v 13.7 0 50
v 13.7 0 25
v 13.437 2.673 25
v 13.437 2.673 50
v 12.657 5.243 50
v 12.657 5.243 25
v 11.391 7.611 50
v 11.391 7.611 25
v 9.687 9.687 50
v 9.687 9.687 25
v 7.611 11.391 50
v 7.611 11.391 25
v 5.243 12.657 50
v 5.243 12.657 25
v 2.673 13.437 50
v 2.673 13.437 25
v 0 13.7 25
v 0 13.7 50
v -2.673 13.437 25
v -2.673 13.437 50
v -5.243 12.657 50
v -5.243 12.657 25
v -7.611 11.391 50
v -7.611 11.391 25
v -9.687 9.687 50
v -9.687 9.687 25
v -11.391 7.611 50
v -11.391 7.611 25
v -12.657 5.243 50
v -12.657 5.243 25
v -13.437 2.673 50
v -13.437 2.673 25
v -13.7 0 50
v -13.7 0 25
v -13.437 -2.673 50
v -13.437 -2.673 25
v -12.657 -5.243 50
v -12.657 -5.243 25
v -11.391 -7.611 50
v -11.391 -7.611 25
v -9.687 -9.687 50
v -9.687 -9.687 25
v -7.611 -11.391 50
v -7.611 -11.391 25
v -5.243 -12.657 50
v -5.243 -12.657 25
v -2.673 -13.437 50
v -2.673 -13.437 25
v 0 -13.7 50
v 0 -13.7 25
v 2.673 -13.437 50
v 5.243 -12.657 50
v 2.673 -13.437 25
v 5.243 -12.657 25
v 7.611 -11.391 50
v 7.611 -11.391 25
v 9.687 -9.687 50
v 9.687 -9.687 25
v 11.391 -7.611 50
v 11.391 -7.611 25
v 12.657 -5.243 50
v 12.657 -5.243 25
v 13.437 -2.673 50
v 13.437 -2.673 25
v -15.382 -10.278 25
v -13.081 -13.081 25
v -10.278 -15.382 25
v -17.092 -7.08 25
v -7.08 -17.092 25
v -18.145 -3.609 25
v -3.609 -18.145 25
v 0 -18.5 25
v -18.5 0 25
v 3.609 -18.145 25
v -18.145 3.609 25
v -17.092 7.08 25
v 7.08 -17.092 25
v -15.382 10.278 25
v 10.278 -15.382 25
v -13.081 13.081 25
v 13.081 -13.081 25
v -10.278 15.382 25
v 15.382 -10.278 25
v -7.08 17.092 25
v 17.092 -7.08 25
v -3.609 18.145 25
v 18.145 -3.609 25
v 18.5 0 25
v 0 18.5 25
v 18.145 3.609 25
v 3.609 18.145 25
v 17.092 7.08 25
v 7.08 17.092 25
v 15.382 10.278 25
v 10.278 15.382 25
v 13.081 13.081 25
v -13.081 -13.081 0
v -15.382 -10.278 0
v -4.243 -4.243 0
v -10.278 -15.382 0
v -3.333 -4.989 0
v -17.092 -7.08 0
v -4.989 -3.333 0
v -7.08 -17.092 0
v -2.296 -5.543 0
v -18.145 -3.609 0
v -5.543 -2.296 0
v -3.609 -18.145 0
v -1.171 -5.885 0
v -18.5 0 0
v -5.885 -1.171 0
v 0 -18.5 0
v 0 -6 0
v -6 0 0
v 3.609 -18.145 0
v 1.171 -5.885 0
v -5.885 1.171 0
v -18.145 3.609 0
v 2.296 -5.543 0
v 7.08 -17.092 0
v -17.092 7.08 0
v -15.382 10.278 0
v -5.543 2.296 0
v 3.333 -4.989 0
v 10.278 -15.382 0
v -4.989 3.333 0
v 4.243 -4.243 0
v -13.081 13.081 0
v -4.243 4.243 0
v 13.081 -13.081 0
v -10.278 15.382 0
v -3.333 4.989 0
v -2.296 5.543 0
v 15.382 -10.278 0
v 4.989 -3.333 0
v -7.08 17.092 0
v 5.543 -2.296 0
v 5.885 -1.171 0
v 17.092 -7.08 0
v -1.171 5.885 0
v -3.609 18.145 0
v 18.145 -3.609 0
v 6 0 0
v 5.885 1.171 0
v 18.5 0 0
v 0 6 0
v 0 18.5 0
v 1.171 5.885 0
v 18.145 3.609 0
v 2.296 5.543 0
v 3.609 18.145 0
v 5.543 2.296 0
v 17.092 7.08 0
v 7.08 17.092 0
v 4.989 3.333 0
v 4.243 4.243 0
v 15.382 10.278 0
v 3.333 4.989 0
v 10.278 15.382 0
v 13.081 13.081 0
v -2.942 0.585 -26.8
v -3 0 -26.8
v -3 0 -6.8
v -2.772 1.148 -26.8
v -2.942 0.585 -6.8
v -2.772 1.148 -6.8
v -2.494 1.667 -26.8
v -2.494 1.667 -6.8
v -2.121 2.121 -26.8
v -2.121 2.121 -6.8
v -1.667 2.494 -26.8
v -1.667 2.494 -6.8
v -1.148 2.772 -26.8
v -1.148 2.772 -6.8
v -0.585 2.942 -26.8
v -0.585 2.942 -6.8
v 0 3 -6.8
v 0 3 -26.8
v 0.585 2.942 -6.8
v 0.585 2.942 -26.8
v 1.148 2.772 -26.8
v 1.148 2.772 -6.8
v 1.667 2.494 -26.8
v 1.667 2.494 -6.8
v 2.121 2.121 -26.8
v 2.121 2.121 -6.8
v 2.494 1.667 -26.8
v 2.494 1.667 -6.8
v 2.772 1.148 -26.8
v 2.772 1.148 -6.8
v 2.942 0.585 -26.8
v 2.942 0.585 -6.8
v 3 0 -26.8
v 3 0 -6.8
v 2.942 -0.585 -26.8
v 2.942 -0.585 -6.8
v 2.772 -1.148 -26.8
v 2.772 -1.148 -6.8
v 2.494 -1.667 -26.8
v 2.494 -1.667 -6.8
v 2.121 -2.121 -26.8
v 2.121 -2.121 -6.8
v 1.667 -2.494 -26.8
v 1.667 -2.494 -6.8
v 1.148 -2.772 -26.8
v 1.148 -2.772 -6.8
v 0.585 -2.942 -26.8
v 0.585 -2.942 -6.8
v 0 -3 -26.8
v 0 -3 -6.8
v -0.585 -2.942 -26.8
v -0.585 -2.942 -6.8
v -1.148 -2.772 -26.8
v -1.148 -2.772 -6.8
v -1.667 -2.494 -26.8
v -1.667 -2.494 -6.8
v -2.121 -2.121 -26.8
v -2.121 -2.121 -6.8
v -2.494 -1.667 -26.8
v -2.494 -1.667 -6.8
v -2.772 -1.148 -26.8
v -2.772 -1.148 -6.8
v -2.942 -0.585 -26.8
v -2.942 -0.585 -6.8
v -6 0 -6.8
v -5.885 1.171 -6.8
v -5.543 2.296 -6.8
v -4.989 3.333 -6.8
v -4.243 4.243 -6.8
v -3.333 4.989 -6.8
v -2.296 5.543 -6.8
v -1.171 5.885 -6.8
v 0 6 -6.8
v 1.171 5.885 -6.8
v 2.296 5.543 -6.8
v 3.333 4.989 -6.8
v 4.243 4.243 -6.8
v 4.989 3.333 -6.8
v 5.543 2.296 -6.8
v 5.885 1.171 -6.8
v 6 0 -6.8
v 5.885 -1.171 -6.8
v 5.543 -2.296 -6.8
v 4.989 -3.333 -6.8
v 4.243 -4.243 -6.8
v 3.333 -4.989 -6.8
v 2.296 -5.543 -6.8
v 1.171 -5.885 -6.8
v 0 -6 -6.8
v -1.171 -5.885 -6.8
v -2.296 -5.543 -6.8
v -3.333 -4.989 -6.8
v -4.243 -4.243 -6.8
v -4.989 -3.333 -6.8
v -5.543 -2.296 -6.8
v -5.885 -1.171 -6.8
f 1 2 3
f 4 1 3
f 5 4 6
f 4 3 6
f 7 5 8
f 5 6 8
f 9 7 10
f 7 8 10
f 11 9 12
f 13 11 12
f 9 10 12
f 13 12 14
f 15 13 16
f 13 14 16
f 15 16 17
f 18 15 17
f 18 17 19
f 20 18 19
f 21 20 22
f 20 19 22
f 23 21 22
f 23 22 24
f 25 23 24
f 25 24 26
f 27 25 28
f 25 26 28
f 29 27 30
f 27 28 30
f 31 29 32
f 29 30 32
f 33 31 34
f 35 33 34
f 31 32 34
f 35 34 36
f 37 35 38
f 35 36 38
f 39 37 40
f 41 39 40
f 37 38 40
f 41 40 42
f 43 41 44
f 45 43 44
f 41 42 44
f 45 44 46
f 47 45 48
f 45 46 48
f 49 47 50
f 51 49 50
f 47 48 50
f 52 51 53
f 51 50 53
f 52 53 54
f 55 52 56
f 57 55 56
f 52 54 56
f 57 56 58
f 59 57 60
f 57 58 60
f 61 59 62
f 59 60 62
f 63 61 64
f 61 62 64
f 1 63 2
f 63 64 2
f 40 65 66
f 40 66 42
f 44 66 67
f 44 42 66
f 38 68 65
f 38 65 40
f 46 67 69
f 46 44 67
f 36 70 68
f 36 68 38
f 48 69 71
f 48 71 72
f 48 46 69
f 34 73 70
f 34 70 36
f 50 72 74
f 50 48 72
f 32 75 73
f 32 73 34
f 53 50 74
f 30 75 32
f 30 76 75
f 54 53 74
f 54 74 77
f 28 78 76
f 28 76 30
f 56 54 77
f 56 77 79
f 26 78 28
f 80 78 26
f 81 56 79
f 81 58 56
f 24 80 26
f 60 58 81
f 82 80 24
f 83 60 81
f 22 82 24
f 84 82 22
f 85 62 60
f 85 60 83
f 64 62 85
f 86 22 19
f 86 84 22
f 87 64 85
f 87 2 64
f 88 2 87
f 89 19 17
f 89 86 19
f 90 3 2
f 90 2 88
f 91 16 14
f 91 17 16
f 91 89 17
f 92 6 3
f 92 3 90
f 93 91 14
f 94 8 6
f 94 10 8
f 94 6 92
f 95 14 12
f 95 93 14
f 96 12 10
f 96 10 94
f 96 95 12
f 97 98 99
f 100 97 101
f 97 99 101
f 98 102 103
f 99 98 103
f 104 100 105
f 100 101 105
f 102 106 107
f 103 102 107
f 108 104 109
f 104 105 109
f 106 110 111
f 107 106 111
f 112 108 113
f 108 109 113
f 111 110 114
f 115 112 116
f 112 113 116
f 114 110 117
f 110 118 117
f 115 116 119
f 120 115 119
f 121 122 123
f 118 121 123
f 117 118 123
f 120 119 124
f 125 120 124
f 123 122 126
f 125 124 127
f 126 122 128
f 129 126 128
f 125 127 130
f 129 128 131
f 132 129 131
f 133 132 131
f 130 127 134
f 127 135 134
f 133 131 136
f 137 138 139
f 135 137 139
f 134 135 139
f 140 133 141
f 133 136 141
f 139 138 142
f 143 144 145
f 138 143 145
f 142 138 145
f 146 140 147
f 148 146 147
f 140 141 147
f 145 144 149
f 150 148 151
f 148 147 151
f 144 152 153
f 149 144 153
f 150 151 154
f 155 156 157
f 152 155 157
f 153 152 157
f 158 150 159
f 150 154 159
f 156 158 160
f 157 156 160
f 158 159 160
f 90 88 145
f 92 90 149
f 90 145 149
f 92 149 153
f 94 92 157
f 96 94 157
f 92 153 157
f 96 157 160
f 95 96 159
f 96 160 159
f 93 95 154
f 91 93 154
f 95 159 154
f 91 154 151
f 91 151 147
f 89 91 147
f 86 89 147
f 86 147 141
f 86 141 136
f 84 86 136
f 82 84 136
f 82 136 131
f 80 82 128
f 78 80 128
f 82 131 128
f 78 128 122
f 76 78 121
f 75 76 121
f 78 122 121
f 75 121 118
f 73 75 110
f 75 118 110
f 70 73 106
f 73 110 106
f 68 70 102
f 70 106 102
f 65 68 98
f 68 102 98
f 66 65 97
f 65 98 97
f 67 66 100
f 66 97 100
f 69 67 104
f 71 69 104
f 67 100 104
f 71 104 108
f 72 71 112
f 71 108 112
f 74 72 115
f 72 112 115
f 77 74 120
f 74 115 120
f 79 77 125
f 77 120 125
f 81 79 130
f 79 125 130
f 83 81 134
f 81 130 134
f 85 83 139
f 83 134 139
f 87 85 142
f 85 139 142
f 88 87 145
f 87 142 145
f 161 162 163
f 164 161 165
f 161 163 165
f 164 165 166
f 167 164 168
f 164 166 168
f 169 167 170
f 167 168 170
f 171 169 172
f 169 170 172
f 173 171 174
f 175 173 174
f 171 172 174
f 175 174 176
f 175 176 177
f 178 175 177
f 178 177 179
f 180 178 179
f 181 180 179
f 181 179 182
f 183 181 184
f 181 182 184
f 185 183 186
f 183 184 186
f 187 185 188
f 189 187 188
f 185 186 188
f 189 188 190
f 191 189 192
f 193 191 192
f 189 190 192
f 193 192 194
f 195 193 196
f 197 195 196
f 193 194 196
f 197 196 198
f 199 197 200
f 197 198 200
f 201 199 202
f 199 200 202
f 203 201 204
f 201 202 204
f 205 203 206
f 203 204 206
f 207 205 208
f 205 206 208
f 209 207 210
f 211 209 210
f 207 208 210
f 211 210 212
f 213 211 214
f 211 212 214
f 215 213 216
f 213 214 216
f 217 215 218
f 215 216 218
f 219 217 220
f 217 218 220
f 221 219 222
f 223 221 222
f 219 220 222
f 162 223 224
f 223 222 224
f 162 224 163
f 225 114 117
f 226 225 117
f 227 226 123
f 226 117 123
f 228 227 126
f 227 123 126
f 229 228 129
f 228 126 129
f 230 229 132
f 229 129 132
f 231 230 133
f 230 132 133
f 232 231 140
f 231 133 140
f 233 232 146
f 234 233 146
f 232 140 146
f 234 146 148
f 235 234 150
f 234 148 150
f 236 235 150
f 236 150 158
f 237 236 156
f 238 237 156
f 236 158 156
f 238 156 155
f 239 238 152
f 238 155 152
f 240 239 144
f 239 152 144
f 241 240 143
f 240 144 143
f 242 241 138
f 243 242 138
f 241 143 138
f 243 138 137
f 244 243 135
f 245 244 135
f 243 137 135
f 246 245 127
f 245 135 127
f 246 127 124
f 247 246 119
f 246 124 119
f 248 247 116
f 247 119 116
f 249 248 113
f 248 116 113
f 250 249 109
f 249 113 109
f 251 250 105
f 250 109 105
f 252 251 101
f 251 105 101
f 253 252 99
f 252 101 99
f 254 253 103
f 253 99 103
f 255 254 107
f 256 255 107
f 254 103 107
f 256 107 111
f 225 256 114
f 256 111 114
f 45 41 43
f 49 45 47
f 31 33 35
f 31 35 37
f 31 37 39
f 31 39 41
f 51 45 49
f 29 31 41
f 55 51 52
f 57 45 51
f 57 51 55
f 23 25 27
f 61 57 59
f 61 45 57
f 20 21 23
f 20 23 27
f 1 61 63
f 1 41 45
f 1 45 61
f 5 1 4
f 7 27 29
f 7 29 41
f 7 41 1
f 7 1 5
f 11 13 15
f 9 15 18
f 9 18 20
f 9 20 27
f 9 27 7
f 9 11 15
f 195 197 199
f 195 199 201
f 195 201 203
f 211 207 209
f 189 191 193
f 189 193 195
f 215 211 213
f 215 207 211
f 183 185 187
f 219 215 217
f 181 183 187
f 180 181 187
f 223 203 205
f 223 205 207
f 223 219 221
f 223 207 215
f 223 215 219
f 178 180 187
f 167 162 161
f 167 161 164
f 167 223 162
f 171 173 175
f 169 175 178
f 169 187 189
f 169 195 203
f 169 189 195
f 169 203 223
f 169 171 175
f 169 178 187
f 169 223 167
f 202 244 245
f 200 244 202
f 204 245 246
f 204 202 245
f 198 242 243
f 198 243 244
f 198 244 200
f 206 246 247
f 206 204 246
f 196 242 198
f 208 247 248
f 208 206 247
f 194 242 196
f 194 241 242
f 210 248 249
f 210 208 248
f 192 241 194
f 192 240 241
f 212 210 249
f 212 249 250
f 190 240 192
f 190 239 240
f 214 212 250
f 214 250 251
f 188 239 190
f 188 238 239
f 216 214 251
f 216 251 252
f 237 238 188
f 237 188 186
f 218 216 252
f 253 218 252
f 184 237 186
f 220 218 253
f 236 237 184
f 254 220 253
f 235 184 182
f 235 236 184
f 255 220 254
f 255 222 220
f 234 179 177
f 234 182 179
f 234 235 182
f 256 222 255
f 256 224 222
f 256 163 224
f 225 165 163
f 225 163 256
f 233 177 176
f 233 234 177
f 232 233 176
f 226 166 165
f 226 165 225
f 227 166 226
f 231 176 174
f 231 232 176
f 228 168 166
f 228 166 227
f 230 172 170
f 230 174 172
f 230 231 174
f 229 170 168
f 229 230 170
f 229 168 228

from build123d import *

# Parameters (mm, degrees)
SKETCH1_R           = 18.5
BOSS_EXTRUDE1_DEPTH = 25
SKETCH2_R           = 6
BOSS_EXTRUDE2_DEPTH = 6.8
SKETCH3_R           = 3
BOSS_EXTRUDE3_DEPTH = 20
SKETCH5_R           = 13.7
BOSS_EXTRUDE4_DEPTH = 25


with BuildPart() as part:
    # Sketch1 → Boss-Extrude1 (new body)
    with BuildSketch(Plane.XY):
        Circle(SKETCH1_R)
    extrude(amount=BOSS_EXTRUDE1_DEPTH)

    # Sketch2 → Boss-Extrude2 (add)
    with BuildSketch(Plane(origin=(0, 0, 0), x_dir=(-1, 0, 0), z_dir=(0, 0, -1))):
        Circle(SKETCH2_R)
    extrude(amount=BOSS_EXTRUDE2_DEPTH)

    # Sketch3 → Boss-Extrude3 (add)
    with BuildSketch(Plane(origin=(0, 0, -6.8), x_dir=(-1, 0, 0), z_dir=(0, 0, -1))):
        Circle(SKETCH3_R)
    extrude(amount=BOSS_EXTRUDE3_DEPTH)

    # Sketch5 → Boss-Extrude4 (add)
    with BuildSketch(Plane.XY.offset(25)):
        Circle(SKETCH5_R)
    extrude(amount=BOSS_EXTRUDE4_DEPTH)


solid = part.part
